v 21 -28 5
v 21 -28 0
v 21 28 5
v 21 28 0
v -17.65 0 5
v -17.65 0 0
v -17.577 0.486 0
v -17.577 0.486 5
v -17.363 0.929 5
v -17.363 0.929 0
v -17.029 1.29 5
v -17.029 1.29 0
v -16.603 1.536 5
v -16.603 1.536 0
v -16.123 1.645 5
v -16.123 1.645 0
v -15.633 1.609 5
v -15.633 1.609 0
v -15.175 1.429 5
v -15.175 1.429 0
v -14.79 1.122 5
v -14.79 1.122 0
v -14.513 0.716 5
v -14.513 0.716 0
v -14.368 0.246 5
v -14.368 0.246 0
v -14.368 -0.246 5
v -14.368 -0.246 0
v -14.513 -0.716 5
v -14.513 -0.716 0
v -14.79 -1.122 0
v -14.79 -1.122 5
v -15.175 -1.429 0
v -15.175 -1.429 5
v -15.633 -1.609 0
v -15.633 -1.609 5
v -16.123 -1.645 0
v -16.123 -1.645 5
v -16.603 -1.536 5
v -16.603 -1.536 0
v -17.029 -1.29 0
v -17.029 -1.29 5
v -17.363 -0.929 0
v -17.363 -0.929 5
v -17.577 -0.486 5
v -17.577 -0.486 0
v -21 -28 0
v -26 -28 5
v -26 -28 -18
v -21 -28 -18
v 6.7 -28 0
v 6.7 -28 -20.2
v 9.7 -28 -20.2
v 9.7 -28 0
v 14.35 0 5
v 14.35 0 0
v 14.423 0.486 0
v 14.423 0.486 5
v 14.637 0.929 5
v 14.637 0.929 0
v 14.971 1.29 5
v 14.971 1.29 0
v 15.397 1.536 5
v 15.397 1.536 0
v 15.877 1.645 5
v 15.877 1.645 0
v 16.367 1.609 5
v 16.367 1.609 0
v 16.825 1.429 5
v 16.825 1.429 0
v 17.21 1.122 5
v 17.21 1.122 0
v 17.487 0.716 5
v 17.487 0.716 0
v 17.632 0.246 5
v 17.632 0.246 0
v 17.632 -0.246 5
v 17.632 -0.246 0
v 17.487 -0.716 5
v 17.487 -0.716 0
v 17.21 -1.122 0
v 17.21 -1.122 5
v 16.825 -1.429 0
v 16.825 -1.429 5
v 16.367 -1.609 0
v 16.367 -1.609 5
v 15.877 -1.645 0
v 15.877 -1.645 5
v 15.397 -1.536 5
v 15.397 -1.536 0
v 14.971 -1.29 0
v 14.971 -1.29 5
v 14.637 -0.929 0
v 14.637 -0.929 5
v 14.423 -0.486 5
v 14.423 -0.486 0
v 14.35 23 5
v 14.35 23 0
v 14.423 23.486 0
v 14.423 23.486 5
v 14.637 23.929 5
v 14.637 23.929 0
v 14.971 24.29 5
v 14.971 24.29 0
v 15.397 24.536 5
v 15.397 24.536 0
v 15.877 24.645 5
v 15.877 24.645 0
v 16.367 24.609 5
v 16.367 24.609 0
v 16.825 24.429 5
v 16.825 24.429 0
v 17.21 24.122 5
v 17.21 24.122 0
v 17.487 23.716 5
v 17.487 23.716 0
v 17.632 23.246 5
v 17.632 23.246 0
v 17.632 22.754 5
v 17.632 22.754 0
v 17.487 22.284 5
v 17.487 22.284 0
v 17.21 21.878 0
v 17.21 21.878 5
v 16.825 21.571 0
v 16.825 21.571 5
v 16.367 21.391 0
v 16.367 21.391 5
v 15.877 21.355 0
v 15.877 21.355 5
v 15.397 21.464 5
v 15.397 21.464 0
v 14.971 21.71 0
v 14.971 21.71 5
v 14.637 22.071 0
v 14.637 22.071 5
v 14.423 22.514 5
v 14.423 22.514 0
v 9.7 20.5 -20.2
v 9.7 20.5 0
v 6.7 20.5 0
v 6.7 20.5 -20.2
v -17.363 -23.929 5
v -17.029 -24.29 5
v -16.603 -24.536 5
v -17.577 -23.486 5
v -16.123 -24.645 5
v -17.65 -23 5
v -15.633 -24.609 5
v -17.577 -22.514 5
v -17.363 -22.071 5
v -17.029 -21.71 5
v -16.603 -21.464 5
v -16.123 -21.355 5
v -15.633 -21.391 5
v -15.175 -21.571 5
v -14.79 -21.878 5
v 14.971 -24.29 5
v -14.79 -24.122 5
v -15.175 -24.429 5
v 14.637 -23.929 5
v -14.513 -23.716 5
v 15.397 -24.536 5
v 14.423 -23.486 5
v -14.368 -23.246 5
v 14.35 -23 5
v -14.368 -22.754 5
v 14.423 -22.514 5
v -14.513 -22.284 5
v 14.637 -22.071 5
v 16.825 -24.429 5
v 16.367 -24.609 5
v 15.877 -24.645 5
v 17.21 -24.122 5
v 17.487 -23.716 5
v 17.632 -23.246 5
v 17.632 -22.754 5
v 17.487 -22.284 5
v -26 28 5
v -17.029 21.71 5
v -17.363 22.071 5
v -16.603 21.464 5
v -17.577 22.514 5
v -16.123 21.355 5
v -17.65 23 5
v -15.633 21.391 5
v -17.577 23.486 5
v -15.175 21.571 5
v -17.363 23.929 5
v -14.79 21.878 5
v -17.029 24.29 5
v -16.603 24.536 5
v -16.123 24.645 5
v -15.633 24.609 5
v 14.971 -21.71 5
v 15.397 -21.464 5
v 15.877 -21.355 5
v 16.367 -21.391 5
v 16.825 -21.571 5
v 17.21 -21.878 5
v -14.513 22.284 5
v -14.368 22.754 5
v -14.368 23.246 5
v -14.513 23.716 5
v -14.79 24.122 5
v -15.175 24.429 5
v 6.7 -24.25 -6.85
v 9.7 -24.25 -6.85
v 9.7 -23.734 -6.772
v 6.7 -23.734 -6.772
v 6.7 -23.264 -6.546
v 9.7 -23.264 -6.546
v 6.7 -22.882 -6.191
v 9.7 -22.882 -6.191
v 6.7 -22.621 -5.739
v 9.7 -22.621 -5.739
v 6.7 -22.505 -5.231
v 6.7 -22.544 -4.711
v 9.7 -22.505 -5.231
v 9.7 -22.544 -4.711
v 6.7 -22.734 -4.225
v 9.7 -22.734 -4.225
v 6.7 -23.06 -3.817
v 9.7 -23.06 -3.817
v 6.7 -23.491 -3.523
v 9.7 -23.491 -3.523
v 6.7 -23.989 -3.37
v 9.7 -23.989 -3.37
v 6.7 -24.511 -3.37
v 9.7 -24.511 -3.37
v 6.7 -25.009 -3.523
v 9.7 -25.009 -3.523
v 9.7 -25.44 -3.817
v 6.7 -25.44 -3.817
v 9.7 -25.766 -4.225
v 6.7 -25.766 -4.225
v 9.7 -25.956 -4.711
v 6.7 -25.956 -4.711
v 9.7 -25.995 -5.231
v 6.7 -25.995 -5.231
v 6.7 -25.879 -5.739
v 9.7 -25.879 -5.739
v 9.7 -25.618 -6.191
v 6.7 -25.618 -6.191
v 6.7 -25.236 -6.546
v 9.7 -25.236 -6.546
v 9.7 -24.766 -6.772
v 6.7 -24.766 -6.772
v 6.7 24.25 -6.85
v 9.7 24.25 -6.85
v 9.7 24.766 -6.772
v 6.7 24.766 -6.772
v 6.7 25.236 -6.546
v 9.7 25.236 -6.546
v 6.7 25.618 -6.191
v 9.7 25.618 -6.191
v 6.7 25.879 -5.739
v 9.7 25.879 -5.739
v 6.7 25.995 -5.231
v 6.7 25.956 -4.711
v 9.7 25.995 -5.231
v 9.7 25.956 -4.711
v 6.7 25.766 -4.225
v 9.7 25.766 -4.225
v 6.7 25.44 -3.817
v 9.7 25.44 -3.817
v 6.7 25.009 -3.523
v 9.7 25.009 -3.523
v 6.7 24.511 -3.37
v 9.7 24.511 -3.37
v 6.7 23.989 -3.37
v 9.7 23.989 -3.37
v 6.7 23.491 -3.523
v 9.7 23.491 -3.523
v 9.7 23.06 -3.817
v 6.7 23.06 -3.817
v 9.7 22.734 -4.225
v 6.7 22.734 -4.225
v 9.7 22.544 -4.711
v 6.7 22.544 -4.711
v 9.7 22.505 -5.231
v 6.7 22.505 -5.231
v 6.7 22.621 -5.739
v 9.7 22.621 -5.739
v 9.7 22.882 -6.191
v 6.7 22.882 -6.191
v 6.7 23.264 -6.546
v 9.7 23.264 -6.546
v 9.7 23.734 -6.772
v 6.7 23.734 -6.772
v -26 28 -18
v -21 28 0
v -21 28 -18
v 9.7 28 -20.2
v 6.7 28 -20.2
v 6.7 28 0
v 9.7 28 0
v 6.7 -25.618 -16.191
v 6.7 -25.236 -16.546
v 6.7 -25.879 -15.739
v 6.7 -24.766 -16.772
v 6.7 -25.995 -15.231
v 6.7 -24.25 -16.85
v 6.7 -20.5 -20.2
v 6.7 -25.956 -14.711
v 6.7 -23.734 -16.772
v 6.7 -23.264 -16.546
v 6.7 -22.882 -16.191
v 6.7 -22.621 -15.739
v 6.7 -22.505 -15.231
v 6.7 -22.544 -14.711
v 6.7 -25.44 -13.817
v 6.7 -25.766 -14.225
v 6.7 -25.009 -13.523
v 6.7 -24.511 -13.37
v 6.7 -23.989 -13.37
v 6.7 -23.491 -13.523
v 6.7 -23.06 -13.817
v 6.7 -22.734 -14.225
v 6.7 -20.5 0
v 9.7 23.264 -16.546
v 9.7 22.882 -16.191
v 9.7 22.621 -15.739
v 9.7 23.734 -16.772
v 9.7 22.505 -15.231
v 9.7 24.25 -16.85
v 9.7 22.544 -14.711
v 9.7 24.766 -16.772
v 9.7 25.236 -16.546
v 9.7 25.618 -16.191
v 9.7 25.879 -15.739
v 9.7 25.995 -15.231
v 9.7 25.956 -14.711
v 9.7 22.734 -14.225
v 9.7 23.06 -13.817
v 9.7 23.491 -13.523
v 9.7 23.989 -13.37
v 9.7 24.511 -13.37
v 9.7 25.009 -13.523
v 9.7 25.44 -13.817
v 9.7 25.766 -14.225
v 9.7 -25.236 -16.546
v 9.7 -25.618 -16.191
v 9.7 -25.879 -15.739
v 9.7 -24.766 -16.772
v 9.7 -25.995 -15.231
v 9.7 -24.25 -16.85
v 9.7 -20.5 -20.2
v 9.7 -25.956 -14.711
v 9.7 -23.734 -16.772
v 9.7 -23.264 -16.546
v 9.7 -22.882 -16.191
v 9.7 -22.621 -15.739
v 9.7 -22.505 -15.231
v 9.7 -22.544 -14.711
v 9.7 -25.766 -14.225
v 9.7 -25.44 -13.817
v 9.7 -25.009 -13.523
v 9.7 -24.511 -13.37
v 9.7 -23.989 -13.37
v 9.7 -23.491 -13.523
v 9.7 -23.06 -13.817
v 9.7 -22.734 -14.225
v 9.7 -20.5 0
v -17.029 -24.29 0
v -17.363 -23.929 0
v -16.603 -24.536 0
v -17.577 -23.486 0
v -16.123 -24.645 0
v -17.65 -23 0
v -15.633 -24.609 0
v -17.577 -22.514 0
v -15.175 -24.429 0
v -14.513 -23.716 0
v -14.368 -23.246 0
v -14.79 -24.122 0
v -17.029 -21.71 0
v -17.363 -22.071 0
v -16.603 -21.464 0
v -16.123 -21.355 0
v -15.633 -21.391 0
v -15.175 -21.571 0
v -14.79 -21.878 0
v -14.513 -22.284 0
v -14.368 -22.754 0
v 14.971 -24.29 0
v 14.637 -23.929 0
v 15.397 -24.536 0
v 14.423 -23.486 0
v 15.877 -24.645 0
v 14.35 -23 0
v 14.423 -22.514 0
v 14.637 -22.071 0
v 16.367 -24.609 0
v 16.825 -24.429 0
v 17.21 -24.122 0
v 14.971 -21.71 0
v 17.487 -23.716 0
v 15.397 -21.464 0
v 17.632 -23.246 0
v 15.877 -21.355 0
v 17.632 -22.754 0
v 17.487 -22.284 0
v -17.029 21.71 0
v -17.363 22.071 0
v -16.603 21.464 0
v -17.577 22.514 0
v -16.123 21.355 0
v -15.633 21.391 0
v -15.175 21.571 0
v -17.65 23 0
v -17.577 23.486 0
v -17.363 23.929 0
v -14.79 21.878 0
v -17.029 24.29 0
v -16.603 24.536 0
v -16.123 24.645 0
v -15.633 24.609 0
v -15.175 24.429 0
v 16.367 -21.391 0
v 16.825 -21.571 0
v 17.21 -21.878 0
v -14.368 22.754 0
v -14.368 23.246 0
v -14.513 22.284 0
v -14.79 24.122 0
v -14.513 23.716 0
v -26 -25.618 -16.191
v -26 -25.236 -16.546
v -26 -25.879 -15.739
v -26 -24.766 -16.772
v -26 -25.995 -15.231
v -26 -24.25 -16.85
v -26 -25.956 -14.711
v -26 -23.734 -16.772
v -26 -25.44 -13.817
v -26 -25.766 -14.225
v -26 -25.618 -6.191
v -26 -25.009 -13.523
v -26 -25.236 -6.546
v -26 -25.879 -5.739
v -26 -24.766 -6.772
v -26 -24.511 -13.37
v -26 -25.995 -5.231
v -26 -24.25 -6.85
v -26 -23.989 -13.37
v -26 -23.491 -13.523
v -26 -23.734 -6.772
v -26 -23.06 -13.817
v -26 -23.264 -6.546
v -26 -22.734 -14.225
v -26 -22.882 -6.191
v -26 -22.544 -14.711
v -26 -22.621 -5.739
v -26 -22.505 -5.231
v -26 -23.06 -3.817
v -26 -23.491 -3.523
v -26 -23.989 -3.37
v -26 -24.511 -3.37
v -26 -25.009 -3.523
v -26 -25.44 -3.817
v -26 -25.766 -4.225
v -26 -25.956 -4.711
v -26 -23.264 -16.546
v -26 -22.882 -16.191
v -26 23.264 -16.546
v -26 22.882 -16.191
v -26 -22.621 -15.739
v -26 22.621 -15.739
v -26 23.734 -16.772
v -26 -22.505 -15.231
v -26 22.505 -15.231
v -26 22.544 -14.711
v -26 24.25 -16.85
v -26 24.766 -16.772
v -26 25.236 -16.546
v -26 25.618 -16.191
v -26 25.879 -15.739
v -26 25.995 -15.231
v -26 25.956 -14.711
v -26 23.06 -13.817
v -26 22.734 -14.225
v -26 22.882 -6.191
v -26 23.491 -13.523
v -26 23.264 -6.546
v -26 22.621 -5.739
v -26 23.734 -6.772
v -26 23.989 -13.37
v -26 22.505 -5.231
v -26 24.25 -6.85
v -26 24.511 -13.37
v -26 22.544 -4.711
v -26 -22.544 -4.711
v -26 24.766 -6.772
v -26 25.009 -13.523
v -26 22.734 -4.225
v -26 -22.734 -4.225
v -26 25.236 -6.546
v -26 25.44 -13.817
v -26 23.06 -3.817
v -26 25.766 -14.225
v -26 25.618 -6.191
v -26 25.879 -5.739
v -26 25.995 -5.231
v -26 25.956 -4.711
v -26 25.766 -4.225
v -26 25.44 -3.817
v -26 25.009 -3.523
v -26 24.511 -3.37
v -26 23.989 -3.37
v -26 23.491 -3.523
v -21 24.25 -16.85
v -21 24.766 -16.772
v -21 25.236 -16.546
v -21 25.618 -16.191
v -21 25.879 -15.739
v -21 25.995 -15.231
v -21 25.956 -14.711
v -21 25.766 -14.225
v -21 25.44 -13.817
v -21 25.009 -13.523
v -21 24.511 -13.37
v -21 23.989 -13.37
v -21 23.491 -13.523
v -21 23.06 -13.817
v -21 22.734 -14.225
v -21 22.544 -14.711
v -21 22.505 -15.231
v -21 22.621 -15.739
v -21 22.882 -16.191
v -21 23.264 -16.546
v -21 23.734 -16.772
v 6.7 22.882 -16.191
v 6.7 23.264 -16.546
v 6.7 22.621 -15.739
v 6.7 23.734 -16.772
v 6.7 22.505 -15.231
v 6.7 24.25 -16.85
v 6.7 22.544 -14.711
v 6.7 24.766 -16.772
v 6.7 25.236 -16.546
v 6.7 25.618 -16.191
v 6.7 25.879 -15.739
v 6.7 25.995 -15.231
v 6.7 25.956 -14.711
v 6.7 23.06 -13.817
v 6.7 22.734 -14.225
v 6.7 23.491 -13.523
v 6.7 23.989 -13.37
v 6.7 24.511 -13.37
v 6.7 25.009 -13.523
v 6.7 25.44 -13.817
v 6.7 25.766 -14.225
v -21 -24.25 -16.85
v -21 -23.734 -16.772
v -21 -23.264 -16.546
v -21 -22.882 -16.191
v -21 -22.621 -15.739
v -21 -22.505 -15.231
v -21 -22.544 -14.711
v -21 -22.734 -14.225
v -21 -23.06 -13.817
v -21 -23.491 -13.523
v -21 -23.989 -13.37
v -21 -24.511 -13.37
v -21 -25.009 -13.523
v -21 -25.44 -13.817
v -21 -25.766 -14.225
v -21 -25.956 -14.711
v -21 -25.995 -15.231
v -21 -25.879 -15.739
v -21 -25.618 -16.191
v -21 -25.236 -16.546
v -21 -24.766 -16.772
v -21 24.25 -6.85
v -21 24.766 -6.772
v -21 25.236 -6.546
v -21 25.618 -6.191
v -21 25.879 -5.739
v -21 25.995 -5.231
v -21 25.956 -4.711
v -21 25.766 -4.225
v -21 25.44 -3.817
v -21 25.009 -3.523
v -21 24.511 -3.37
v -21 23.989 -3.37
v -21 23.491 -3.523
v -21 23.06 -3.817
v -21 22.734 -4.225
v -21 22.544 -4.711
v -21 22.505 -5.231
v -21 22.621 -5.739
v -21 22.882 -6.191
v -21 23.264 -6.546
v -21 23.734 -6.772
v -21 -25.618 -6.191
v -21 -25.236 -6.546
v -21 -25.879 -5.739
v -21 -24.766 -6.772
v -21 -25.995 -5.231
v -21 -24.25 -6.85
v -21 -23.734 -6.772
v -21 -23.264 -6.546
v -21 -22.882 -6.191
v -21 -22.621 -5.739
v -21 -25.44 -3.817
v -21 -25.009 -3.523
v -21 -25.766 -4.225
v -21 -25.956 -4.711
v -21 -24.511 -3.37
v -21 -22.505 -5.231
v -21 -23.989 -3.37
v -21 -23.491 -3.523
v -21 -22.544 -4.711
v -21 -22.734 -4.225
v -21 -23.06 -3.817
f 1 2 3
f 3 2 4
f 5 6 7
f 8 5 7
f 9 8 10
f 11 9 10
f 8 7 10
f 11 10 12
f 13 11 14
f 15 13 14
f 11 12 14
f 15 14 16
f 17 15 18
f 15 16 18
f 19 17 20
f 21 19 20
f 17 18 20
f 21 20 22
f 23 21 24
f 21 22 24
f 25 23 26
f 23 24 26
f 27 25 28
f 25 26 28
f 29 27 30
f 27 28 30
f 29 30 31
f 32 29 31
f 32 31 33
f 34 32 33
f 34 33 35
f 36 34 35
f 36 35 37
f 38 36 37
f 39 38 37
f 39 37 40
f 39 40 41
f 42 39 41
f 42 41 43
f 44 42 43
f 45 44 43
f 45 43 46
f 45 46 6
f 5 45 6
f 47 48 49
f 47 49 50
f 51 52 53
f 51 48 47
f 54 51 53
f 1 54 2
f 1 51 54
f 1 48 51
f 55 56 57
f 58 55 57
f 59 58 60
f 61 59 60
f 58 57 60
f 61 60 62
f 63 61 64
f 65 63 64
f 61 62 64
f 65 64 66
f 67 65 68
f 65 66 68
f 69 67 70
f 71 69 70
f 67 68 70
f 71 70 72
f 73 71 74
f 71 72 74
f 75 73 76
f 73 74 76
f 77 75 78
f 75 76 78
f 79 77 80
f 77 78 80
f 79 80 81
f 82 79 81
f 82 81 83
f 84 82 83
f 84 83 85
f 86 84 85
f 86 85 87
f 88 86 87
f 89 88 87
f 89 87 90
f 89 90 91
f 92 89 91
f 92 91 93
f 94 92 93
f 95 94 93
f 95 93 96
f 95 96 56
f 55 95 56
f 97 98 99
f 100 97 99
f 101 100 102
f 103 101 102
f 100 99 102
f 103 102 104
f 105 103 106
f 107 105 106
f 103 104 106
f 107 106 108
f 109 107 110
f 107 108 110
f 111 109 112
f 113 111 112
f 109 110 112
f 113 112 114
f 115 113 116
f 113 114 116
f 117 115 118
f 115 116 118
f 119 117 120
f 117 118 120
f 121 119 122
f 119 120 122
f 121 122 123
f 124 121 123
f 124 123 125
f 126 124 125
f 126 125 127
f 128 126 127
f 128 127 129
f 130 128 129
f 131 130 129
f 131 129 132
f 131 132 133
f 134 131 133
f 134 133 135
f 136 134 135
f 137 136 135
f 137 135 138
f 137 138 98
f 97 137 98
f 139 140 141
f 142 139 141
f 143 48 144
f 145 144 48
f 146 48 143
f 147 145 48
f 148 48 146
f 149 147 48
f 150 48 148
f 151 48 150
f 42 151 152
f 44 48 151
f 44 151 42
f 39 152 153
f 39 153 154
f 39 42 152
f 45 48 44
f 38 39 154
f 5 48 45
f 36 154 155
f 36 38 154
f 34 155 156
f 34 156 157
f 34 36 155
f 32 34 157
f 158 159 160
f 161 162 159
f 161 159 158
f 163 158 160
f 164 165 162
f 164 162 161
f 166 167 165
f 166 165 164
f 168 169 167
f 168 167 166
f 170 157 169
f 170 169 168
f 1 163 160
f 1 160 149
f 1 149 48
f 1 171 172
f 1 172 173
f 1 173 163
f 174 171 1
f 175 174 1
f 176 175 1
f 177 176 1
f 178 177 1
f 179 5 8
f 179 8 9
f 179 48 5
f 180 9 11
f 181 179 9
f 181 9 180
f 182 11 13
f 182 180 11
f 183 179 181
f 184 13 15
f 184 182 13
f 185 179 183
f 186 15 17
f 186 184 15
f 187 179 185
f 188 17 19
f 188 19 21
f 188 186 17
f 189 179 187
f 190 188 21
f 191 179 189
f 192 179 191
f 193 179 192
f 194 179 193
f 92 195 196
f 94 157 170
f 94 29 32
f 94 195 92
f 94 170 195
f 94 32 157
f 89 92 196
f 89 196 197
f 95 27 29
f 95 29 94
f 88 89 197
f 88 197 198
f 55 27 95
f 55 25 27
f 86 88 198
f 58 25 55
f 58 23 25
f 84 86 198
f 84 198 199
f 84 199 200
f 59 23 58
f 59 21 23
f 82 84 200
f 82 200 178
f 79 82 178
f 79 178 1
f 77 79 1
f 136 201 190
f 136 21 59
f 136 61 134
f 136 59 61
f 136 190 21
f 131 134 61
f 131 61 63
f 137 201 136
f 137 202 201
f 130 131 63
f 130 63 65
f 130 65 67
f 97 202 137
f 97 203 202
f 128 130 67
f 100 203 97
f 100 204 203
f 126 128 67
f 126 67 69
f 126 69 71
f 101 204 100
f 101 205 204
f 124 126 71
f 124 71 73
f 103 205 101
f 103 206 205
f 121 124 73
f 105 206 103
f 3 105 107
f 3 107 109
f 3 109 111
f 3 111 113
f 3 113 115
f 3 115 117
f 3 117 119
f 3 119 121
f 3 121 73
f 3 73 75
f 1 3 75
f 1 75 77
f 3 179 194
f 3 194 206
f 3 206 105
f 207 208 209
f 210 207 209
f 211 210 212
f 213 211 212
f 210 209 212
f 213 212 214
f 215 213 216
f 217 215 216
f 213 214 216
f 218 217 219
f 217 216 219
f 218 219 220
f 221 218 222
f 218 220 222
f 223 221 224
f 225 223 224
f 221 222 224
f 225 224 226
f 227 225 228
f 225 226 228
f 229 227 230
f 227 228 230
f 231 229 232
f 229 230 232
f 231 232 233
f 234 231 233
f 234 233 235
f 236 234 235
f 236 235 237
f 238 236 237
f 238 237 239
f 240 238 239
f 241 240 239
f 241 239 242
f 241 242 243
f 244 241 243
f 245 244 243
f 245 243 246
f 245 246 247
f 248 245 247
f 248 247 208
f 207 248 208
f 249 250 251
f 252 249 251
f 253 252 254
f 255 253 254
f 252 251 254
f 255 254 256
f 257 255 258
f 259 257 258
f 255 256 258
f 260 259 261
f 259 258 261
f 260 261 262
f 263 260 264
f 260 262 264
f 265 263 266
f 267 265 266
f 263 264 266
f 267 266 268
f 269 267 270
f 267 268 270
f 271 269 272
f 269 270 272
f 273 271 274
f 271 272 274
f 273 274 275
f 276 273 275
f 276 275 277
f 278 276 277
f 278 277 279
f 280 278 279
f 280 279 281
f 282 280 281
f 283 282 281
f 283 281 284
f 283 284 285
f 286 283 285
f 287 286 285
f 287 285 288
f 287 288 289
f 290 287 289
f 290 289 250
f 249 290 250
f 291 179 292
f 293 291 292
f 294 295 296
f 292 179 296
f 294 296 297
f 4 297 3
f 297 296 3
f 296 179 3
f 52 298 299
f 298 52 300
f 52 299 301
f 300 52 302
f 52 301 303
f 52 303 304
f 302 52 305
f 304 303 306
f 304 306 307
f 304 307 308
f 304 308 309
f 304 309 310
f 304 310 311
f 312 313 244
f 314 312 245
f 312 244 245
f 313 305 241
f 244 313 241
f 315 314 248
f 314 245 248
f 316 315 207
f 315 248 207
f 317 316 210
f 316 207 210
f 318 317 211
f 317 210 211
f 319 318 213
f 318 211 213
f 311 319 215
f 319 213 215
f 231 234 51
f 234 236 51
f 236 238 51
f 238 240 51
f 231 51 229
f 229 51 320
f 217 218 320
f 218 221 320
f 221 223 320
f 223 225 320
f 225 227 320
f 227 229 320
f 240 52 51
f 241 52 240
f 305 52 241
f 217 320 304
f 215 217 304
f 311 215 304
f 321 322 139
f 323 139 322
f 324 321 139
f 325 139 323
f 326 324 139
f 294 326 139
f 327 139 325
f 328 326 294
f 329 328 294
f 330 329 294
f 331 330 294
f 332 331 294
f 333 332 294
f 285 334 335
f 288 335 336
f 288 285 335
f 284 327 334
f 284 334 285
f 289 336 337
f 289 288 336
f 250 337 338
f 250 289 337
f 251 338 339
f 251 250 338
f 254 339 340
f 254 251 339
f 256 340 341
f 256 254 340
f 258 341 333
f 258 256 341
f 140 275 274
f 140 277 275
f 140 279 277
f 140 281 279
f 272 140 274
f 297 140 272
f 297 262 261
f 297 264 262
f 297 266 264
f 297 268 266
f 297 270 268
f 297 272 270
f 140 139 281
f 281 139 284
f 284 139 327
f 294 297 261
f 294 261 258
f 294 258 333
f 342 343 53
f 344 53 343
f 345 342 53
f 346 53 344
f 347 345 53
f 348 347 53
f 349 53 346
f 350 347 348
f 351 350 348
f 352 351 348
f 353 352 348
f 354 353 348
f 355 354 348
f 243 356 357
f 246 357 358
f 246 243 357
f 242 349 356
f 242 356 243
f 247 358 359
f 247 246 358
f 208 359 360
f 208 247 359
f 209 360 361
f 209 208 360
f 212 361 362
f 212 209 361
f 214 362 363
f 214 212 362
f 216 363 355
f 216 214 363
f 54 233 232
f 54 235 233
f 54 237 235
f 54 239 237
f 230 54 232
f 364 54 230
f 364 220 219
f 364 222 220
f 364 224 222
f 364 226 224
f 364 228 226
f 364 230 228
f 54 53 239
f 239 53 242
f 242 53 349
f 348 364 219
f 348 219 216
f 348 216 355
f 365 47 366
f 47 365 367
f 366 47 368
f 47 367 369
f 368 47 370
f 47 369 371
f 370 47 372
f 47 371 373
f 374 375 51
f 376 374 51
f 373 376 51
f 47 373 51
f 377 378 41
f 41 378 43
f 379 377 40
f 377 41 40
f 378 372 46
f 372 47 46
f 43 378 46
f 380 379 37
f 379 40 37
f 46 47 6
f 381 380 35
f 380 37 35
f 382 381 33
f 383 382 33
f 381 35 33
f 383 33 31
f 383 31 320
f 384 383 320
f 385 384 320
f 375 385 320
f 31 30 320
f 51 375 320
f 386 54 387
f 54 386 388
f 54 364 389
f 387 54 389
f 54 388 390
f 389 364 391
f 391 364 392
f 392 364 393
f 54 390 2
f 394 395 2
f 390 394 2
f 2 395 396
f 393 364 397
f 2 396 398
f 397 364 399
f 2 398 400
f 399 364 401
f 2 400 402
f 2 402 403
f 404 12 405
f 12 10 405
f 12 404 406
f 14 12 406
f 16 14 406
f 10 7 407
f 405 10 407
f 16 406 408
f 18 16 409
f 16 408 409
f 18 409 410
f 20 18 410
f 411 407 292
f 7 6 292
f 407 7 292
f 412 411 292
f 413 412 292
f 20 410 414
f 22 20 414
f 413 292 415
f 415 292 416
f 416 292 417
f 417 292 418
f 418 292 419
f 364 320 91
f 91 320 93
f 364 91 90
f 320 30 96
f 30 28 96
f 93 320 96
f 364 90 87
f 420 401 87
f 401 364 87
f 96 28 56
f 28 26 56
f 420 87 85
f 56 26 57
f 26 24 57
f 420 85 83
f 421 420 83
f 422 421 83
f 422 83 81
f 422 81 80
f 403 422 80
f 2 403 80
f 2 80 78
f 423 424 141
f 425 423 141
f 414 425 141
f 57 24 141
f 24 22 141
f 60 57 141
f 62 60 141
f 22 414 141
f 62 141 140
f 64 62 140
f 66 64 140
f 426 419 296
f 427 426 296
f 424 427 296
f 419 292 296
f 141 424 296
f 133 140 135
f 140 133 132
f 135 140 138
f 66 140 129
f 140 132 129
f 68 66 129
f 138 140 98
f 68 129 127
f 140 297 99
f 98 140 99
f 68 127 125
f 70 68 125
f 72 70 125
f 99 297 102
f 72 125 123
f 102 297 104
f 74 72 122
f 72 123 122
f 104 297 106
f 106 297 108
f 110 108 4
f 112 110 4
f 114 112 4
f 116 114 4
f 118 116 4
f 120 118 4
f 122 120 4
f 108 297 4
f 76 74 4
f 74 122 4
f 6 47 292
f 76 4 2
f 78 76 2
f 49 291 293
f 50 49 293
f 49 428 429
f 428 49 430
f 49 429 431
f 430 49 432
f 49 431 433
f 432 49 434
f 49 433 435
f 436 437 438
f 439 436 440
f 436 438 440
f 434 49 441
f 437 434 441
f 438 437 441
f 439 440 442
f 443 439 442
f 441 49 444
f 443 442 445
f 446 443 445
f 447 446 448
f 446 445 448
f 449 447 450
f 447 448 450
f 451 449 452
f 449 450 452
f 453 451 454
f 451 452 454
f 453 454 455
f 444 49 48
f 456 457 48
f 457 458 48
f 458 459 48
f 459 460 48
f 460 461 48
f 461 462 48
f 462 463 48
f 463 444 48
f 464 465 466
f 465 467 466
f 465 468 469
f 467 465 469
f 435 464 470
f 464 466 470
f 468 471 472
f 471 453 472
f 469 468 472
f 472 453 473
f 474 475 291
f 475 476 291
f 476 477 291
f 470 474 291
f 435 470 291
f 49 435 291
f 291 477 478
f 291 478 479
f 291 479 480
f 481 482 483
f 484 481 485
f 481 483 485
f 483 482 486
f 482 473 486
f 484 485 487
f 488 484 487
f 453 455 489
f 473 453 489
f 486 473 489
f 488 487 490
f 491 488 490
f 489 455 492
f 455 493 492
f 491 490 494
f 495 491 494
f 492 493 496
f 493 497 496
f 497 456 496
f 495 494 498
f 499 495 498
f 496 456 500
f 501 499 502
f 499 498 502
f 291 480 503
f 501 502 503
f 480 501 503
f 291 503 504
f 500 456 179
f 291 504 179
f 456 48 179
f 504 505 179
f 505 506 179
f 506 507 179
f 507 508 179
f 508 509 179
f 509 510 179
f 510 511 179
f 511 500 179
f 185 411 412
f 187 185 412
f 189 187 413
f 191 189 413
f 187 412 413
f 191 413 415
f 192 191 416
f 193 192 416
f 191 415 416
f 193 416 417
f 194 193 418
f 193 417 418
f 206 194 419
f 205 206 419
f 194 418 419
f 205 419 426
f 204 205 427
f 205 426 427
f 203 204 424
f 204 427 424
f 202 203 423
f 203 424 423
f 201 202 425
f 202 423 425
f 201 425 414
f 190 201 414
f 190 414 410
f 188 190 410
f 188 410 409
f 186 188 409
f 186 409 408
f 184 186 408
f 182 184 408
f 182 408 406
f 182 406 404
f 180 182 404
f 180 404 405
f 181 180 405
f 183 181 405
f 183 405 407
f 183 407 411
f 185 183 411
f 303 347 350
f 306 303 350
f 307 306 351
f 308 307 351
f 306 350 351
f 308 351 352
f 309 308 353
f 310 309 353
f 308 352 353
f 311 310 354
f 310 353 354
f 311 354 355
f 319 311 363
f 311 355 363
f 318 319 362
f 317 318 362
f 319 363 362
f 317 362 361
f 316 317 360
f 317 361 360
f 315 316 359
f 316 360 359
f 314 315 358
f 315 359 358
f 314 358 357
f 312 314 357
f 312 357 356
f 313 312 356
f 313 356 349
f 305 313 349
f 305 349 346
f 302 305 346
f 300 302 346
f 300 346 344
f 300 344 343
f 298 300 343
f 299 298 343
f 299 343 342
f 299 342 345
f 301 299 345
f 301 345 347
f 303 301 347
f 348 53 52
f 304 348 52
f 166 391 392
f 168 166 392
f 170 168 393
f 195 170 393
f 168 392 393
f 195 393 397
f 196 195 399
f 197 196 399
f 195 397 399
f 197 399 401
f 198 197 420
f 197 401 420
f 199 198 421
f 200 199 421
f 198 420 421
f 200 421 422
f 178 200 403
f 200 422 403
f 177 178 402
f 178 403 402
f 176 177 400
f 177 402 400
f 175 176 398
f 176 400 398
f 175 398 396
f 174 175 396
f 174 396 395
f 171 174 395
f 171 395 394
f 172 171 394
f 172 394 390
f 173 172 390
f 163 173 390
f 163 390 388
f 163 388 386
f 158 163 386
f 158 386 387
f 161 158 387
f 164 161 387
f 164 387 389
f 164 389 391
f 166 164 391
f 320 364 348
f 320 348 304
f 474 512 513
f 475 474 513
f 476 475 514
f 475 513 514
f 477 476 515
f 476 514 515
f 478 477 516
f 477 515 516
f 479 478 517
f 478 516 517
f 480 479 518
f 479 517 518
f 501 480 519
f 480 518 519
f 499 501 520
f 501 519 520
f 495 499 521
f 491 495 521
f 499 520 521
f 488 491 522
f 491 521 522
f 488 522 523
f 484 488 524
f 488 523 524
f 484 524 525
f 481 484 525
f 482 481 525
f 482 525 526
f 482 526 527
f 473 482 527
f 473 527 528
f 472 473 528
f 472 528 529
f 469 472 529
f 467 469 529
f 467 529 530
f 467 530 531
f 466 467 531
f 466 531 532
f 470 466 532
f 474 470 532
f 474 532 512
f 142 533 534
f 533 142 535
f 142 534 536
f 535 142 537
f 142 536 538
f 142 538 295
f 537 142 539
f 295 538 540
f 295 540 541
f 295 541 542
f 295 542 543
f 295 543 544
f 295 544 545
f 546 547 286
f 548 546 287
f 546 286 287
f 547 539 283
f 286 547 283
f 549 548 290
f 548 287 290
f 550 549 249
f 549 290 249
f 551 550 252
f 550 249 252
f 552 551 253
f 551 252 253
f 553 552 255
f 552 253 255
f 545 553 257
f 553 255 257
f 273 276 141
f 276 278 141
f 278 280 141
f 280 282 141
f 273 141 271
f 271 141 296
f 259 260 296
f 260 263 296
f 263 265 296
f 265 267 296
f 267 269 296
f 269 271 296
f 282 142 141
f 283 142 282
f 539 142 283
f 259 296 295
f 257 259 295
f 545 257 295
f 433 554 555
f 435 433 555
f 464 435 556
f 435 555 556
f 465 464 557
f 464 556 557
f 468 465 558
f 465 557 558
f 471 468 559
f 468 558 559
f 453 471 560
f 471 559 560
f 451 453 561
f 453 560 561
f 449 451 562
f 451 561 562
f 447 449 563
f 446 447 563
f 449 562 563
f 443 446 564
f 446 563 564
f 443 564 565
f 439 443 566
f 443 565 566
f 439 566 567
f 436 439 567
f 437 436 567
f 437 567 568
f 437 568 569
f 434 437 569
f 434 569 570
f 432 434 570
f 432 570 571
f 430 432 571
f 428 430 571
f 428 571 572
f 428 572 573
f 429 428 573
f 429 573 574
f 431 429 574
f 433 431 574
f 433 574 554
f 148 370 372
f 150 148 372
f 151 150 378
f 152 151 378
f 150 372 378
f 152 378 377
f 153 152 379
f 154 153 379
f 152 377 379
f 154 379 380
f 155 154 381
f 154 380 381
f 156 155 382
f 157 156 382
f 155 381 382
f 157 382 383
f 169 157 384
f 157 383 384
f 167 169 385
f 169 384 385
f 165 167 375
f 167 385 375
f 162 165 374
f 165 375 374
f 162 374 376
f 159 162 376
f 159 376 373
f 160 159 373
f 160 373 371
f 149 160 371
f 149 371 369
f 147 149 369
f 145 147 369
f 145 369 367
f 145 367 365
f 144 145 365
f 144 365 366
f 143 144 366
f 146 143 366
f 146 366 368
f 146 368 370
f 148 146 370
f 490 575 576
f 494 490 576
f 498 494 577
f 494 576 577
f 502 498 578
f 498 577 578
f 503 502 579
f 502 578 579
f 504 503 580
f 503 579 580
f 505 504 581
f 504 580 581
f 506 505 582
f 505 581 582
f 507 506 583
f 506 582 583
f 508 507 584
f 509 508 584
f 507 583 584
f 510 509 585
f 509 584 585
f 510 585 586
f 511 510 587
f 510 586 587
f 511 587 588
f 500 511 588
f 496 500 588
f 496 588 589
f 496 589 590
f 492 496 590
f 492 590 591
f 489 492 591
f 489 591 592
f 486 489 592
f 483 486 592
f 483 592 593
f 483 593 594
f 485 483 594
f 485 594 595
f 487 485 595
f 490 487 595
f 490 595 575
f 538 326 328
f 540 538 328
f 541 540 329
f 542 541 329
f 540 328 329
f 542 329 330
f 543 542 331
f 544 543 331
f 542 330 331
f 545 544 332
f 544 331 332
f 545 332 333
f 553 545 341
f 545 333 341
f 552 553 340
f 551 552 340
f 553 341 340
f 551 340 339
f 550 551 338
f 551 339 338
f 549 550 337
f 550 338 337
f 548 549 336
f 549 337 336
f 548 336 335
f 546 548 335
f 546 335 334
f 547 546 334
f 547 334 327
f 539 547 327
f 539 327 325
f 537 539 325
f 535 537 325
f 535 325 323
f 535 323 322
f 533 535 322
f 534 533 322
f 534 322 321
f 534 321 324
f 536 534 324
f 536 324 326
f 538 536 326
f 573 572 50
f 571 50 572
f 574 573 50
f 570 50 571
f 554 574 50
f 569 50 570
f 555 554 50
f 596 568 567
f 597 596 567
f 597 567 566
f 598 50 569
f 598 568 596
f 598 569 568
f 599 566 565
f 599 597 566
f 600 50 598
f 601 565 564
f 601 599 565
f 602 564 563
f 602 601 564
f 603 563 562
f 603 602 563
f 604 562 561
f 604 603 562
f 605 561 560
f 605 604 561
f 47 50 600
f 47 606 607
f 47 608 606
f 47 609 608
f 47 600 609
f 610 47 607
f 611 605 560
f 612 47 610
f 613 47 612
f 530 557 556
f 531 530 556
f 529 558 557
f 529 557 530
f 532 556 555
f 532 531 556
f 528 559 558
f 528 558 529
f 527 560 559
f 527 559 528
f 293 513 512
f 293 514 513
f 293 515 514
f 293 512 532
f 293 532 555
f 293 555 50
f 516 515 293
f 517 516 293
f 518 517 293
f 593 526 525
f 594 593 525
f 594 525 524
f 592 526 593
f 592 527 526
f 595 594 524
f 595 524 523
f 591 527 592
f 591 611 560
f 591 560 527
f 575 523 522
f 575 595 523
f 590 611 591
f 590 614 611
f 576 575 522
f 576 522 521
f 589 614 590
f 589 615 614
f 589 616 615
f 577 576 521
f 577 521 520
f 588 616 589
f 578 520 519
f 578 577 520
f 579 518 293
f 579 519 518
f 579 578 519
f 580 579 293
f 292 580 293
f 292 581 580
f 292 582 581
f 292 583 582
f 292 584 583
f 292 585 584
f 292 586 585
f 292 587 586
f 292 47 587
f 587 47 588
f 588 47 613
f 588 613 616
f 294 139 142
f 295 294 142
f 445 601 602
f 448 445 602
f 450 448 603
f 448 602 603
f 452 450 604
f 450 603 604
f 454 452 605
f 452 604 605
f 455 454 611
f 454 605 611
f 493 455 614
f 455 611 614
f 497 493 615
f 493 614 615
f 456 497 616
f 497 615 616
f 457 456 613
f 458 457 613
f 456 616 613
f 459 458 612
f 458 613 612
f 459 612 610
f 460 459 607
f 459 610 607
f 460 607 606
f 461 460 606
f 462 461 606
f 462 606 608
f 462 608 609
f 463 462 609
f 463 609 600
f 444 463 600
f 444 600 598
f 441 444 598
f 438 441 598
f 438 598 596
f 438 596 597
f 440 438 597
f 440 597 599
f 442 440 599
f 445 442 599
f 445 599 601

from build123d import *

# Parameters (mm, degrees)
SKETCH_1_W          = 42
SKETCH_1_H          = 56
EXTRUDE_1_DEPTH     = 5
SKETCH_2_W          = 5
SKETCH_2_H          = 56
EXTRUDE_2_DEPTH     = 23
SKETCH_3_W          = 3
SKETCH_3_H          = 7.5
EXTRUDE_3_DEPTH     = 20.2
SKETCH_4_R          = 1.75
CUT_EXTRUDE_1_DEPTH = 36.7
SKETCH_5_R          = 1.65
CUT_EXTRUDE_2_DEPTH = 10


with BuildPart() as part:
    # 草图1 → 凸台-拉伸1 (new body)
    with BuildSketch(Plane.XY):
        Rectangle(SKETCH_1_W, SKETCH_1_H)
    extrude(amount=EXTRUDE_1_DEPTH)

    # 草图2 → 凸台-拉伸2 (add)
    with BuildSketch(Plane.XY.offset(5)):
        with Locations((-23.5, 0)):
            Rectangle(SKETCH_2_W, SKETCH_2_H)
    extrude(amount=-EXTRUDE_2_DEPTH)

    # 草图3 → 凸台-拉伸3 (add)
    with BuildSketch(Plane(origin=(0, 0, 0), x_dir=(-1, 0, 0), z_dir=(0, 0, -1))):
        with Locations((-8.2, -24.25)):
            Rectangle(SKETCH_3_W, SKETCH_3_H)
        with Locations((-8.2, 24.25)):
            Rectangle(SKETCH_3_W, SKETCH_3_H)
    extrude(amount=EXTRUDE_3_DEPTH)

    # 草图4 → 切除-拉伸1 (cut, through all)
    with BuildSketch(Plane(origin=(9.7, 0, 0), x_dir=(0, 0, -1), z_dir=(1, 0, 0))):
        with Locations((5.1, 24.25)):
            Circle(SKETCH_4_R)
        with Locations((15.1, 24.25)):
            Circle(SKETCH_4_R)
        with Locations((15.1, -24.25)):
            Circle(SKETCH_4_R)
        with Locations((5.1, -24.25)):
            Circle(SKETCH_4_R)
    extrude(amount=-CUT_EXTRUDE_1_DEPTH, mode=Mode.SUBTRACT)

    # 草图5 → 切除-拉伸2 (cut)
    with BuildSketch(Plane(origin=(0, 0, 0), x_dir=(-1, 0, 0), z_dir=(0, 0, -1))):
        with Locations((-16, 23)):
            Circle(SKETCH_5_R)
        with Locations((-16, -23)):
            Circle(SKETCH_5_R)
        with Locations((16, -23)):
            Circle(SKETCH_5_R)
        with Locations((16, 23)):
            Circle(SKETCH_5_R)
        with Locations((16, 0)):
            Circle(SKETCH_5_R)
        with Locations((-16, 0)):
            Circle(SKETCH_5_R)
    extrude(amount=-CUT_EXTRUDE_2_DEPTH, mode=Mode.SUBTRACT)


solid = part.part
